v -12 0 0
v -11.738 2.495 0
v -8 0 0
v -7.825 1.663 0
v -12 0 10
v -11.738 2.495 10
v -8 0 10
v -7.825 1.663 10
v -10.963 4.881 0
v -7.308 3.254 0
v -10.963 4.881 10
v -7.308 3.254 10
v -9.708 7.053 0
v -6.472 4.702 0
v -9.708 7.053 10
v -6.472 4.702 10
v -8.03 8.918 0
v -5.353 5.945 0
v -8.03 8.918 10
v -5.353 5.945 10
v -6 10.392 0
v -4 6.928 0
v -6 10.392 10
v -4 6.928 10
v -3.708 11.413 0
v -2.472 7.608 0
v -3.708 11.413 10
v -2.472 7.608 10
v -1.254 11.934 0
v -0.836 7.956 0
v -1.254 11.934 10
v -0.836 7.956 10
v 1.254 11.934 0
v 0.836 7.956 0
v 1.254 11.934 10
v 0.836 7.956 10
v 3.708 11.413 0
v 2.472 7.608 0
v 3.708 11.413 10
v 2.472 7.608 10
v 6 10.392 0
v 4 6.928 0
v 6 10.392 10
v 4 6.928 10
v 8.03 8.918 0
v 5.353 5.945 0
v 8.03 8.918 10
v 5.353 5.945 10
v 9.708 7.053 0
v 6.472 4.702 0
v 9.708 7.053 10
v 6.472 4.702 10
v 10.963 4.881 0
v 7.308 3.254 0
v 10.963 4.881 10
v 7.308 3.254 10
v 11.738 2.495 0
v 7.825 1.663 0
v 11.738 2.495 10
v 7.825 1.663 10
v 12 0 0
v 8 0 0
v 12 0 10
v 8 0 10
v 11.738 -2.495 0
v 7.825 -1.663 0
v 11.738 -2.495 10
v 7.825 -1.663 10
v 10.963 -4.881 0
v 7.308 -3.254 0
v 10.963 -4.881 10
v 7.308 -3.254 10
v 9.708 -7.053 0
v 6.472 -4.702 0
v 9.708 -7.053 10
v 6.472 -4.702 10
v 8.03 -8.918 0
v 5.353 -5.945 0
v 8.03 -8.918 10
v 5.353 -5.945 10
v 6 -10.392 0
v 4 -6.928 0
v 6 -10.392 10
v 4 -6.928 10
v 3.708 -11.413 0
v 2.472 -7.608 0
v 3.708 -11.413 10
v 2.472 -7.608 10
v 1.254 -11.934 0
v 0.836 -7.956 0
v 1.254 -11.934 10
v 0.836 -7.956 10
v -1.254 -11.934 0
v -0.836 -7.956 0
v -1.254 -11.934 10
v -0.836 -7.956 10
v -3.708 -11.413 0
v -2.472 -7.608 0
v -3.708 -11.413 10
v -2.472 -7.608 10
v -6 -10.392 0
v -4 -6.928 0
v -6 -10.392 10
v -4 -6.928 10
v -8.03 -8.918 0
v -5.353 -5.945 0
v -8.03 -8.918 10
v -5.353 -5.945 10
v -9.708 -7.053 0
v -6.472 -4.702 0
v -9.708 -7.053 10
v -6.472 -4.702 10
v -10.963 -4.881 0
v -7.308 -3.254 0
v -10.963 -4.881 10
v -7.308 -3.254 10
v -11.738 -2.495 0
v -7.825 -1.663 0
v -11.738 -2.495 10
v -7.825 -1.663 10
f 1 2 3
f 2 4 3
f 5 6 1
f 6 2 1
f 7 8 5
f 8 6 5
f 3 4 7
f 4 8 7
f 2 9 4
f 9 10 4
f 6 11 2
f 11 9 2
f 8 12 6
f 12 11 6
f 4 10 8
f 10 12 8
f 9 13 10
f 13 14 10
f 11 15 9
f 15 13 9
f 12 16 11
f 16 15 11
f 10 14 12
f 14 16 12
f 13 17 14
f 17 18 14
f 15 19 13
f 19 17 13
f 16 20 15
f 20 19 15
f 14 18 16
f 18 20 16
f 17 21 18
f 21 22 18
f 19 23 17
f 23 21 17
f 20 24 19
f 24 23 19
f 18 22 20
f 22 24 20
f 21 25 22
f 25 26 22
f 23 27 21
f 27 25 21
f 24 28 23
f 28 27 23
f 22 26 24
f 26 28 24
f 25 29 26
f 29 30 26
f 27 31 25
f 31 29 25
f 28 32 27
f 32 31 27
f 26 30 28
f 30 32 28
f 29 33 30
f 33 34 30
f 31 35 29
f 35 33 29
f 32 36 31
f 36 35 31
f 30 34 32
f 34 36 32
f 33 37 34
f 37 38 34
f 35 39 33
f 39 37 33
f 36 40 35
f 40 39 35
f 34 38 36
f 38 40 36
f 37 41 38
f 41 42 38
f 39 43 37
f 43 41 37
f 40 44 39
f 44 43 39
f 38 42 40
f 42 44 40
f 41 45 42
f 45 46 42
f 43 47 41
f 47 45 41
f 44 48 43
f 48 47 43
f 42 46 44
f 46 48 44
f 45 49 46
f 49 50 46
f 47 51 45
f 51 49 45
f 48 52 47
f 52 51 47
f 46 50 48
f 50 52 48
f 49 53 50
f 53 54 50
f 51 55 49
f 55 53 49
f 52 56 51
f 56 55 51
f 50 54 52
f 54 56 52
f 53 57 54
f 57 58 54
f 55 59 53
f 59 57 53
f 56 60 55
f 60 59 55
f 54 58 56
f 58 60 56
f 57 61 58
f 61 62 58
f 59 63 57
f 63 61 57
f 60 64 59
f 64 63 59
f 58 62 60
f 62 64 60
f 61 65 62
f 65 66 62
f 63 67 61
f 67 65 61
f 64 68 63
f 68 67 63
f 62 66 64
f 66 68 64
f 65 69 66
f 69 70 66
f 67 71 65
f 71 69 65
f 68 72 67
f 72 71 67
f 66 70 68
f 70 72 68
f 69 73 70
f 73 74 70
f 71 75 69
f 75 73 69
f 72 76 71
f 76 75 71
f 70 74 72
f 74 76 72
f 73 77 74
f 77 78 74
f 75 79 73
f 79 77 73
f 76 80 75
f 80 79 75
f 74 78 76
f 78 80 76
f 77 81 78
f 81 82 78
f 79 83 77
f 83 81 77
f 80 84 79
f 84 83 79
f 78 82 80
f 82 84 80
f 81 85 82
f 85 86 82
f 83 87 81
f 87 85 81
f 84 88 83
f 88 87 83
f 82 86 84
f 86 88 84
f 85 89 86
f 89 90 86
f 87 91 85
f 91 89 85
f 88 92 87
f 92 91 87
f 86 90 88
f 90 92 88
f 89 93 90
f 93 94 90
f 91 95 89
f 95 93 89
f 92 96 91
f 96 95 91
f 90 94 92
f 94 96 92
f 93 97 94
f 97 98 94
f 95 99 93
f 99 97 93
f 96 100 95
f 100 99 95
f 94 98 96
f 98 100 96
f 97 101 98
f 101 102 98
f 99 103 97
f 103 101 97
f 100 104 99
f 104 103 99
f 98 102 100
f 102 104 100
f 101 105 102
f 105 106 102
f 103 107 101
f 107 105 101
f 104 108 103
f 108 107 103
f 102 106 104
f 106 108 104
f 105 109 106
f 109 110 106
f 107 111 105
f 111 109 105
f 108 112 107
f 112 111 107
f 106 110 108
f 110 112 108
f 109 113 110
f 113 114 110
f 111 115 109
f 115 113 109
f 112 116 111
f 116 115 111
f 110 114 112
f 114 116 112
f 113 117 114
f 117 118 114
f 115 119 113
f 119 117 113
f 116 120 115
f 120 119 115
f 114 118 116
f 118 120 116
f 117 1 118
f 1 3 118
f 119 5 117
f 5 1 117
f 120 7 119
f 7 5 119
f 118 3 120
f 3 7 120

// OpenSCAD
// rotate_extrude lathe-axis / orientation check. A washer/tube: a 4-wide x 10-tall square offset
// to inner radius 8, revolved about OpenSCAD's Z axis. Expect a ring/tube — inner radius 8, wall
// thickness 4 (outer radius 12), height 10 — correctly oriented after the Z-up->Y-up root xform.
rotate_extrude() translate([8, 0]) square([4, 10]);
